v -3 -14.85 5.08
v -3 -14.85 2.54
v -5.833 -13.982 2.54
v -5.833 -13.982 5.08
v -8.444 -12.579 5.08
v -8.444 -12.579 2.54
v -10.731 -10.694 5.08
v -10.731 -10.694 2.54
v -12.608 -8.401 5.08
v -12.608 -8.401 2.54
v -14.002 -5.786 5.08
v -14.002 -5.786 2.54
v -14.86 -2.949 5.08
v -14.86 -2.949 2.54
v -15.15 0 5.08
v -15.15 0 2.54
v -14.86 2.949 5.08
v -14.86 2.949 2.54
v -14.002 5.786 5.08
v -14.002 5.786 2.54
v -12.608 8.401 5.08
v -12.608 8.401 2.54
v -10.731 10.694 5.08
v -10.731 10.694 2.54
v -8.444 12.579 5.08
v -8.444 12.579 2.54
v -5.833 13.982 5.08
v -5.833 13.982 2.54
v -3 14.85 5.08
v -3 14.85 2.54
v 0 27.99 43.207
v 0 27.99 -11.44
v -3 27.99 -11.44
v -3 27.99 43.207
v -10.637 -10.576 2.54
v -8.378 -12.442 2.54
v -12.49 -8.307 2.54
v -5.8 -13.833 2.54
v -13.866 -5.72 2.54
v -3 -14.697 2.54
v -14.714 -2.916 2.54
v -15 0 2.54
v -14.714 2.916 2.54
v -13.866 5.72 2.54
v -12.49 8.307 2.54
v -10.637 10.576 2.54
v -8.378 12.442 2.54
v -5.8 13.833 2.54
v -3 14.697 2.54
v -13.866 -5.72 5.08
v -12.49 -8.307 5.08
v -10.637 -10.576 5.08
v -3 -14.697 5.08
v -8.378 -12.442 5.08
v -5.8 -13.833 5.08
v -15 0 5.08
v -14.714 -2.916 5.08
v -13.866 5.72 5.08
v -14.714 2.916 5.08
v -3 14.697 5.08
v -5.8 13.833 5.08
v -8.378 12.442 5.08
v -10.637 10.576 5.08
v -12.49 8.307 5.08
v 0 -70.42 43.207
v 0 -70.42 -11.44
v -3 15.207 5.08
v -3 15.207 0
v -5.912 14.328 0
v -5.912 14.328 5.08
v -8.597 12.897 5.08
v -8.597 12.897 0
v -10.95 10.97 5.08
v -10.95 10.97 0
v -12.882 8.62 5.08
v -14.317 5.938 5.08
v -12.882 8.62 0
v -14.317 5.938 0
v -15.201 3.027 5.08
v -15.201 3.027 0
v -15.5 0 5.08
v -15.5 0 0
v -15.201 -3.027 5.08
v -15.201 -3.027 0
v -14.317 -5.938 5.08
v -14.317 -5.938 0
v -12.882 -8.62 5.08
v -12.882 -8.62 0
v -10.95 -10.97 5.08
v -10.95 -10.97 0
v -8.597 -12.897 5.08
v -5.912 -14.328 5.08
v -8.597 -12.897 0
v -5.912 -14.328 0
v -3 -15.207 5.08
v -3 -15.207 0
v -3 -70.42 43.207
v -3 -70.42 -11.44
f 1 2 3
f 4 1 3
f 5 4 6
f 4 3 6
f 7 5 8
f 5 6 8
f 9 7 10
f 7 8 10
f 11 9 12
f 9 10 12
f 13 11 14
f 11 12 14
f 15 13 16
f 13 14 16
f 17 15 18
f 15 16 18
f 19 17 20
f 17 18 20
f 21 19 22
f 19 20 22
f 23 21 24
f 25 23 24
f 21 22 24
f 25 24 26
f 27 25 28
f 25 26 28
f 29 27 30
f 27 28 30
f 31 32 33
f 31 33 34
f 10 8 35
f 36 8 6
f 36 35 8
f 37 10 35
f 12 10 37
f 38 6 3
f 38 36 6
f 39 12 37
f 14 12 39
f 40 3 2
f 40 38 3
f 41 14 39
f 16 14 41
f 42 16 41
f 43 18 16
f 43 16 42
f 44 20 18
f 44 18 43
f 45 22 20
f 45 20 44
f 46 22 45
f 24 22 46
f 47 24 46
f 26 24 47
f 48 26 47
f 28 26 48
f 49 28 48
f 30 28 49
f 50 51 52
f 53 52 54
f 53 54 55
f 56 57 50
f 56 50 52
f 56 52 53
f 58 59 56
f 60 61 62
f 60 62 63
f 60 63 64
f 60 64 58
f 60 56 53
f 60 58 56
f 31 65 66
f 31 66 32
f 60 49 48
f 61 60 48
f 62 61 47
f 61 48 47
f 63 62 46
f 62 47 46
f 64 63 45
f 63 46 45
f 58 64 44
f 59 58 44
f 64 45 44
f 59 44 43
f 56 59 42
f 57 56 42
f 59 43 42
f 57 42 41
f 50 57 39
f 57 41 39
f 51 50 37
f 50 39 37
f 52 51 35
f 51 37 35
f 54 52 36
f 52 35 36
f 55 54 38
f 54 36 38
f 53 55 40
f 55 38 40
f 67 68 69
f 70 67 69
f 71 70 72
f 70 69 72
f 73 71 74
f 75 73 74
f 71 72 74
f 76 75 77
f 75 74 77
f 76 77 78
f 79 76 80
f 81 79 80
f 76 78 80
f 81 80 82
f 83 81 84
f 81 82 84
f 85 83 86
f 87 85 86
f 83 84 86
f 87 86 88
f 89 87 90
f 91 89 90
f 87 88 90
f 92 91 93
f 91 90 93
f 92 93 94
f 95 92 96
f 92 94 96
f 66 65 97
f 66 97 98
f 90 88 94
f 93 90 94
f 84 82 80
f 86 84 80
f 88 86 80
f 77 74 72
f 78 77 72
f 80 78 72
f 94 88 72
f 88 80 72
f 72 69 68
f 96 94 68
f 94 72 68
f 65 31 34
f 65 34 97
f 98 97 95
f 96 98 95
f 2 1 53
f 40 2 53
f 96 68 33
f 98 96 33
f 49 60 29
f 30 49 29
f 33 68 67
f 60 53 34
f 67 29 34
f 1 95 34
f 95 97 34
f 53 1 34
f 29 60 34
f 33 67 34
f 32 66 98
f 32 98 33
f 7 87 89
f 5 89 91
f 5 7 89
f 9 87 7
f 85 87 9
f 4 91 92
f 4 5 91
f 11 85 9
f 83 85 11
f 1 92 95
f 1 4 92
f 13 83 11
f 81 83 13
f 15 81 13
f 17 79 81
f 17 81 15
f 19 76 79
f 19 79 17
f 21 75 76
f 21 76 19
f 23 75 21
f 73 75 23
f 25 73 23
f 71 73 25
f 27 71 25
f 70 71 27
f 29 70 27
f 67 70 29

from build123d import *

# Parameters (mm, degrees)
F1_DEPTH = 2.54
F2_DEPTH = 2.54
F3_DEPTH = 5.08
F5_DEPTH = 3


with BuildPart() as f1:
    # F0 (on Top) → F1 (new body)
    with BuildSketch(Plane.XY):
        with BuildLine():
            Line((0, -15), (0, 15))
            ThreePointArc((0, 15), (-15, 0), (0, -15))
        make_face()
    extrude(amount=F1_DEPTH)

    # F0 (on Top) + F1_face (on face) → F2 (join)
    with BuildSketch(Plane.XY):
        with BuildLine():
            Line((0, 15), (0, 15.15))
            ThreePointArc((0, 15.15), (-15.15, 0), (0, -15.15))
            Line((0, -15.15), (0, -15))
            ThreePointArc((0, -15), (-15, 0), (0, 15))
        make_face()
    with BuildSketch(Plane(origin=(-6.3661977237, 0, 2.54), x_dir=(1, 0, 0), z_dir=(0, 0, 1))):
        with BuildLine():
            ThreePointArc((6.3661977237, 15), (-8.6338022763, 0), (6.3661977237, -15))
            Line((6.3661977237, -15), (6.3661977237, 15))
        make_face()
    extrude(amount=F2_DEPTH)

    # F0 (on Top) → F3 (join)
    with BuildSketch(Plane.XY):
        with BuildLine():
            Line((0, 15.15), (0, 15.5))
            ThreePointArc((0, 15.5), (-15.5, 0), (0, -15.5))
            Line((0, -15.5), (0, -15.15))
            ThreePointArc((0, -15.15), (-15.15, 0), (0, 15.15))
        make_face()
    extrude(amount=F3_DEPTH)

    # F4 (on Right) → F5 (join)
    with BuildSketch(Plane.YZ):
        Polygon((15.5500713736, -11.4404093474), (27.990128845, -11.4404093474), (27.990128845, 43.2069823146), (-70.4196095467, 43.2069823146), (-70.4196095467, -11.4404093474), align=None)
    extrude(amount=-F5_DEPTH)


solid = f1.part
